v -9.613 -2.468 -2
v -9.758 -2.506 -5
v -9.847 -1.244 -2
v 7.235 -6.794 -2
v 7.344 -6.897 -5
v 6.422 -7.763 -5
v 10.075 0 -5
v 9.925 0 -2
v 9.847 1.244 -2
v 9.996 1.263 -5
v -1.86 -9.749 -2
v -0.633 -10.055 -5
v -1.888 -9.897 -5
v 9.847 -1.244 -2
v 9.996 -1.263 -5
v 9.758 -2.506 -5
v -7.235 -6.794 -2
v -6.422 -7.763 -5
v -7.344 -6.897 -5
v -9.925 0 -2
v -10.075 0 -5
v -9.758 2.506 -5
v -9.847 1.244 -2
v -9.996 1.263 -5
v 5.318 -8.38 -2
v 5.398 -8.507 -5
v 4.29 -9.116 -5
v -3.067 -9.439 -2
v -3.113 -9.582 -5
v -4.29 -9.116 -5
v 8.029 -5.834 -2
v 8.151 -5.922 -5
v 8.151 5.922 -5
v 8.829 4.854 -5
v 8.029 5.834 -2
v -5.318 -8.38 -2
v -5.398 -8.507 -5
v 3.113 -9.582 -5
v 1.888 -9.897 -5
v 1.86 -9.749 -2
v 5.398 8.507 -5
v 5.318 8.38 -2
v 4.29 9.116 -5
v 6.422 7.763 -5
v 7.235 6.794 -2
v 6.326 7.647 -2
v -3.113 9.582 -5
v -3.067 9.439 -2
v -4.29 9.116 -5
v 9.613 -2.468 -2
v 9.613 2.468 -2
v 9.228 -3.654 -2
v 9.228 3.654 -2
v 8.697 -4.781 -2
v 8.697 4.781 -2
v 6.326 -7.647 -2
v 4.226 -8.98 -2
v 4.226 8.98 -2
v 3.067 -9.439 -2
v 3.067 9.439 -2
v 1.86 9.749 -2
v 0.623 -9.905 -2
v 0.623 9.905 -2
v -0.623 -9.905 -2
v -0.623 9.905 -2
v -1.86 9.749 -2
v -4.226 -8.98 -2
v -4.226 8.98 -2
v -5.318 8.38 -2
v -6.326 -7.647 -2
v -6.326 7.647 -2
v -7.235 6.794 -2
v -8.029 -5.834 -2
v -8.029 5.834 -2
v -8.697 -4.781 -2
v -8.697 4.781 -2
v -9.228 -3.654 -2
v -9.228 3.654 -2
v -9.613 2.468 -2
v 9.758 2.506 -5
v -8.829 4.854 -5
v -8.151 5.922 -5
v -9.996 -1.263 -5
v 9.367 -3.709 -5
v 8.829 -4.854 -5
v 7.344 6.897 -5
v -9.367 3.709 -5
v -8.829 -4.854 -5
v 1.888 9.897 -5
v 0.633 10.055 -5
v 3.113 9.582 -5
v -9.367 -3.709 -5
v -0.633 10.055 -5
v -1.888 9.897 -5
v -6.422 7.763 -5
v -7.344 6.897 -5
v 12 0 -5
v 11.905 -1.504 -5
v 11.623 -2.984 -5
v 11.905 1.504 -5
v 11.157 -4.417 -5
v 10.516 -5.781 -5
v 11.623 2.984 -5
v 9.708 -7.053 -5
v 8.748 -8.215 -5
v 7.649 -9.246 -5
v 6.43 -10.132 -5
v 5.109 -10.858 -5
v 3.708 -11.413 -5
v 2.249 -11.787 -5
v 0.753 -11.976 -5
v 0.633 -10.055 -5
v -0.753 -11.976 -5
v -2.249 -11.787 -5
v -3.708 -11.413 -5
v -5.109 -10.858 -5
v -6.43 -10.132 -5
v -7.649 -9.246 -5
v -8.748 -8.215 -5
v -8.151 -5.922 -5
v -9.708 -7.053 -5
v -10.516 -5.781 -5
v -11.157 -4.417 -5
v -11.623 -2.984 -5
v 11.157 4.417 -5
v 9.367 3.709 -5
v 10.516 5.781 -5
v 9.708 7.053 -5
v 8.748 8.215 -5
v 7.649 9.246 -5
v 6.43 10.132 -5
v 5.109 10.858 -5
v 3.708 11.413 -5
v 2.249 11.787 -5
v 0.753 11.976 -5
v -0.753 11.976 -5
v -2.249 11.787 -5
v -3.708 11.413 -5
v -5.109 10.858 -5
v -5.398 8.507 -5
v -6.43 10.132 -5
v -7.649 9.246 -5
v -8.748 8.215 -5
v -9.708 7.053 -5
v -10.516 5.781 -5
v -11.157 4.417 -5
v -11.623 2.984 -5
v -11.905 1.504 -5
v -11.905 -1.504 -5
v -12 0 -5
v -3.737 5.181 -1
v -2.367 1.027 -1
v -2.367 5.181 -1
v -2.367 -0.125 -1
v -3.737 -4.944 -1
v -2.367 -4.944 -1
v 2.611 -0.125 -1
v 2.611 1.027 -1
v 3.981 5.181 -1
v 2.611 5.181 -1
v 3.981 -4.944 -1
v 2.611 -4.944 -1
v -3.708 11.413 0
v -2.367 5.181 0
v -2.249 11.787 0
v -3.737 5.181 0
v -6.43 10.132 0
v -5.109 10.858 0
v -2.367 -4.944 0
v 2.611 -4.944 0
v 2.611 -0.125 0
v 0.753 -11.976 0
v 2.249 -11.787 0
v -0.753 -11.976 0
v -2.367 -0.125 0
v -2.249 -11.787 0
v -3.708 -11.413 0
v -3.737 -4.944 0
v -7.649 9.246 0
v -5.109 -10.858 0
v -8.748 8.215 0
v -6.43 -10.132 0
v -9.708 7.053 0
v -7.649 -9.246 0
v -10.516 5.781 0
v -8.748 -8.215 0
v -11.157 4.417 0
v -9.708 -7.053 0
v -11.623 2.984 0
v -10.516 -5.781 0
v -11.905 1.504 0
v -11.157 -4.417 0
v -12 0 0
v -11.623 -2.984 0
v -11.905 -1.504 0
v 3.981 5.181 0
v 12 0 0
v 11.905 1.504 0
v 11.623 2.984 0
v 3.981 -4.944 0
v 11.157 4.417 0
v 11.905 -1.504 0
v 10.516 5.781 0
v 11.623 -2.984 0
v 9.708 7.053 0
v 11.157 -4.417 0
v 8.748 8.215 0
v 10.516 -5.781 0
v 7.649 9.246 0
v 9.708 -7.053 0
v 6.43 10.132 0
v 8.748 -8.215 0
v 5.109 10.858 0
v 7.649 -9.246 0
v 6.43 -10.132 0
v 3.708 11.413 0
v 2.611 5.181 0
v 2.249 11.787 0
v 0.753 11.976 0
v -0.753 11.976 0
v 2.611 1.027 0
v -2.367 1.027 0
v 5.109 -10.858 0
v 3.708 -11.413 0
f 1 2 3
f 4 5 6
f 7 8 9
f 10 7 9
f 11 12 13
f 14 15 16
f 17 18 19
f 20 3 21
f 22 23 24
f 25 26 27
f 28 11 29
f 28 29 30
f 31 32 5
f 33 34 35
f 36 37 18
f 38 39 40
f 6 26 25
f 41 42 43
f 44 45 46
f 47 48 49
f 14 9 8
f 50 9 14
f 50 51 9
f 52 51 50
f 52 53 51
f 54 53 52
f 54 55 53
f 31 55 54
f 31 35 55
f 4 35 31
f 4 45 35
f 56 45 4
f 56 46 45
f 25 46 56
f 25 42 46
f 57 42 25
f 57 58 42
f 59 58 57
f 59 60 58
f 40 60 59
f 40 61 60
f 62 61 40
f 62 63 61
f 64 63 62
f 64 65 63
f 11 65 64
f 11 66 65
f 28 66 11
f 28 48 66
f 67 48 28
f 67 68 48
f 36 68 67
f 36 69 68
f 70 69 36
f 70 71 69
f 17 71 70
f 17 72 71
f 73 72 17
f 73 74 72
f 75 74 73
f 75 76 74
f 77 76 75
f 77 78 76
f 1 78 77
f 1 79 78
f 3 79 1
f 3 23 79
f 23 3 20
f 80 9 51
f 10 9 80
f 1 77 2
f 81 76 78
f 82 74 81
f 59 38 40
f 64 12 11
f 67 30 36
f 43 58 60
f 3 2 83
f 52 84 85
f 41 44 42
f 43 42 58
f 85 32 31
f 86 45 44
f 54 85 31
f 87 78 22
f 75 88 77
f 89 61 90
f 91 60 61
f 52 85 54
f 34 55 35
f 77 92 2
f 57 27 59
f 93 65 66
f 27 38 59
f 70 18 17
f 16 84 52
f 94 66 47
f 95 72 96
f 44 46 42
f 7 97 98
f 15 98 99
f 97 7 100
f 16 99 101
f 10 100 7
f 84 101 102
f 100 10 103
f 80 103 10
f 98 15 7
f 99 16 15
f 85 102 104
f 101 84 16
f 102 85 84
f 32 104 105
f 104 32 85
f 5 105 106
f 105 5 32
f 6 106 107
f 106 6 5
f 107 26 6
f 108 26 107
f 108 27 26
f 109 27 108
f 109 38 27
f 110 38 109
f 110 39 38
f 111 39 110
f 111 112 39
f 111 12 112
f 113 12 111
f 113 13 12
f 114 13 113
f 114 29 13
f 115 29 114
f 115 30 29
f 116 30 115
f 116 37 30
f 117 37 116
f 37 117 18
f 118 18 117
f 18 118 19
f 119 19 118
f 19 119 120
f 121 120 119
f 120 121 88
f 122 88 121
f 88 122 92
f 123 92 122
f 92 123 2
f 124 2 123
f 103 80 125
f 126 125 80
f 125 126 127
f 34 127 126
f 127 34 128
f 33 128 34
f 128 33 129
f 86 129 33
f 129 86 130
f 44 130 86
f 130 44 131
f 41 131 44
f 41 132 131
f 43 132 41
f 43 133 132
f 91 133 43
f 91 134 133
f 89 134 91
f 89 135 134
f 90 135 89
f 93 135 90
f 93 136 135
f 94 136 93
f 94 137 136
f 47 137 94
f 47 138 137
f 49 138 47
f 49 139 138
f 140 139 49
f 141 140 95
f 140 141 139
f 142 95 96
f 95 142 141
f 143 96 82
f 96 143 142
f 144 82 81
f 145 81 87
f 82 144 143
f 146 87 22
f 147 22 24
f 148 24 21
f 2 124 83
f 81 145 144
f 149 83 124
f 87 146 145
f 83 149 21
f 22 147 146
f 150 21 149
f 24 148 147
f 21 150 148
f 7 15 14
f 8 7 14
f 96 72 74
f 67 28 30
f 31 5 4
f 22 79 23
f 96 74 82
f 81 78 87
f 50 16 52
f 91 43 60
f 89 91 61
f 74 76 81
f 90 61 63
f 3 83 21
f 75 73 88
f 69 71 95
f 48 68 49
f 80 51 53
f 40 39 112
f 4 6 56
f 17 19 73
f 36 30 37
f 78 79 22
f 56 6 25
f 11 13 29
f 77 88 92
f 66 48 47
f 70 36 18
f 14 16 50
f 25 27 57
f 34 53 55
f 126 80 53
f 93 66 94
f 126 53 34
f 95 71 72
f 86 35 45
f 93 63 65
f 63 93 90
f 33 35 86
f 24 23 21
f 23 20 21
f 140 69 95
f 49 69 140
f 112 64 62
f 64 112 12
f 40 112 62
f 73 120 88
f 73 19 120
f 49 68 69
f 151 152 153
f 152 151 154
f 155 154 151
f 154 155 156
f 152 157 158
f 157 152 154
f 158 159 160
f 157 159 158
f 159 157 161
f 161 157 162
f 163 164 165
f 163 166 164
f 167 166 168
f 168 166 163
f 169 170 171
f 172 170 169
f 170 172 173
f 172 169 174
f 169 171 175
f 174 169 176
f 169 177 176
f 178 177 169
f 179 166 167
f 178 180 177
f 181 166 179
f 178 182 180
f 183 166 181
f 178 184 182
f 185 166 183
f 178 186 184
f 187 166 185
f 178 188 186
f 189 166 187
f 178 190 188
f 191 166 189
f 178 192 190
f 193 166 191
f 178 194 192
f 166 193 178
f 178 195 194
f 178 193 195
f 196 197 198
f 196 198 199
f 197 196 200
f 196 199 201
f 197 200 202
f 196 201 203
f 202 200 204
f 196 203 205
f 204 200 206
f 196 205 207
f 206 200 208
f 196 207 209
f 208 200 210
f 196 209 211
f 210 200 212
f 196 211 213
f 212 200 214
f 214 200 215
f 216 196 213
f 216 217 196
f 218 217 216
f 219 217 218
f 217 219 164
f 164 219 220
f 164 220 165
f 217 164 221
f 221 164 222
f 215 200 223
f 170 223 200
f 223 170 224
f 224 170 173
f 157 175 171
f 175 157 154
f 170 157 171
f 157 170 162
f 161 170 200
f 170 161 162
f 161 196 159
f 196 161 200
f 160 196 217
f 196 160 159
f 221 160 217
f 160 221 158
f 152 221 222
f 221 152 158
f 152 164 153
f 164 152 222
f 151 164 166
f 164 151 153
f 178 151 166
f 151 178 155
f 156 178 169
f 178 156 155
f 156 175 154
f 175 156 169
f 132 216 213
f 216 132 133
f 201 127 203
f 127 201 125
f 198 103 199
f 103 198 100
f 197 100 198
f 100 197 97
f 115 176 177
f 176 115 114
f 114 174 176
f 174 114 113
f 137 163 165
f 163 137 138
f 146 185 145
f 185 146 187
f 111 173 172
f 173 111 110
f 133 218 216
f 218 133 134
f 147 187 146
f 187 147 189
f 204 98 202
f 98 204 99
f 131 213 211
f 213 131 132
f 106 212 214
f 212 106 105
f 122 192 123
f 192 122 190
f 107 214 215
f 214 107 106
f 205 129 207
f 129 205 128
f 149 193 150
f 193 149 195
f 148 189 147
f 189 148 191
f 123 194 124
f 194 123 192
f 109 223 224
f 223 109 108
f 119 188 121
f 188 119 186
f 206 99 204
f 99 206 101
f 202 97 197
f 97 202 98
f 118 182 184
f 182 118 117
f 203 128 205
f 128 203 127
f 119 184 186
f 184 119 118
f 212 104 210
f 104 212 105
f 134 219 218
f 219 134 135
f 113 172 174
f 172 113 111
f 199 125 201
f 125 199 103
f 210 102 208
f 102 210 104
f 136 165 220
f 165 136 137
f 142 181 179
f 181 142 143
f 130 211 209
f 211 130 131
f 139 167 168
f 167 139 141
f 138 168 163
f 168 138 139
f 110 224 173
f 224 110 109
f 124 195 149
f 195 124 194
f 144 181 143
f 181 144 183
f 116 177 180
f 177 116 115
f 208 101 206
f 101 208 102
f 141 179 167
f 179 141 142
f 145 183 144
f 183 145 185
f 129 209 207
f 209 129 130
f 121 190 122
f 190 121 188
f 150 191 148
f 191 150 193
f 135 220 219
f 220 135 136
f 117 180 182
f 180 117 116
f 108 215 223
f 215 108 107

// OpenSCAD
$fn = 50;

difference() {
	union() {
		translate(v = [0, 0, -5.0]) {
			cylinder(h = 5, r = 12.0);
		}
	}
	union() {
		#translate(v = [0, 0, -5.0]) {
			cylinder(h = 3, r1 = 10.075, r2 = 9.925);
		}
		translate(v = [0, 0, -1]) {
			linear_extrude(height = 1) {
				text(font = "Impact", halign = "center", size = 10, text = "H", valign = "center");
			}
		}
	}
}
